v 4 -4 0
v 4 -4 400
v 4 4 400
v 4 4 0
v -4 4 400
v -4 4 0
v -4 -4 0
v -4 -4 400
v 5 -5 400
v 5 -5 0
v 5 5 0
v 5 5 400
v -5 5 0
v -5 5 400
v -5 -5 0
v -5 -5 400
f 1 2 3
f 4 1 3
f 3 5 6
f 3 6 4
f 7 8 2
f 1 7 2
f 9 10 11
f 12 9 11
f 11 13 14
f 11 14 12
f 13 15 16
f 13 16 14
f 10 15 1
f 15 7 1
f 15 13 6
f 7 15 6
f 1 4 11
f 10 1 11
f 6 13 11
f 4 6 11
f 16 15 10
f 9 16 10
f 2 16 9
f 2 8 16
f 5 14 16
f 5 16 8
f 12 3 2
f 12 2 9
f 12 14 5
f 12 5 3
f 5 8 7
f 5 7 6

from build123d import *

# Parameters (mm, degrees)
SKETCH2_W           = 10
SKETCH2_H           = 10
BOSS_EXTRUDE1_DEPTH = 400
SKETCH3_W           = 8
SKETCH3_H           = 8
CUT_EXTRUDE1_DEPTH  = 400


with BuildPart() as part:
    # Sketch2 → Boss-Extrude1 (new body)
    with BuildSketch(Plane.XY):
        Rectangle(SKETCH2_W, SKETCH2_H)
    extrude(amount=BOSS_EXTRUDE1_DEPTH)

    # Sketch3 → Cut-Extrude1 (cut)
    with BuildSketch(Plane.XY.offset(400)):
        Rectangle(SKETCH3_W, SKETCH3_H)
    extrude(amount=-CUT_EXTRUDE1_DEPTH, mode=Mode.SUBTRACT)


solid = part.part
